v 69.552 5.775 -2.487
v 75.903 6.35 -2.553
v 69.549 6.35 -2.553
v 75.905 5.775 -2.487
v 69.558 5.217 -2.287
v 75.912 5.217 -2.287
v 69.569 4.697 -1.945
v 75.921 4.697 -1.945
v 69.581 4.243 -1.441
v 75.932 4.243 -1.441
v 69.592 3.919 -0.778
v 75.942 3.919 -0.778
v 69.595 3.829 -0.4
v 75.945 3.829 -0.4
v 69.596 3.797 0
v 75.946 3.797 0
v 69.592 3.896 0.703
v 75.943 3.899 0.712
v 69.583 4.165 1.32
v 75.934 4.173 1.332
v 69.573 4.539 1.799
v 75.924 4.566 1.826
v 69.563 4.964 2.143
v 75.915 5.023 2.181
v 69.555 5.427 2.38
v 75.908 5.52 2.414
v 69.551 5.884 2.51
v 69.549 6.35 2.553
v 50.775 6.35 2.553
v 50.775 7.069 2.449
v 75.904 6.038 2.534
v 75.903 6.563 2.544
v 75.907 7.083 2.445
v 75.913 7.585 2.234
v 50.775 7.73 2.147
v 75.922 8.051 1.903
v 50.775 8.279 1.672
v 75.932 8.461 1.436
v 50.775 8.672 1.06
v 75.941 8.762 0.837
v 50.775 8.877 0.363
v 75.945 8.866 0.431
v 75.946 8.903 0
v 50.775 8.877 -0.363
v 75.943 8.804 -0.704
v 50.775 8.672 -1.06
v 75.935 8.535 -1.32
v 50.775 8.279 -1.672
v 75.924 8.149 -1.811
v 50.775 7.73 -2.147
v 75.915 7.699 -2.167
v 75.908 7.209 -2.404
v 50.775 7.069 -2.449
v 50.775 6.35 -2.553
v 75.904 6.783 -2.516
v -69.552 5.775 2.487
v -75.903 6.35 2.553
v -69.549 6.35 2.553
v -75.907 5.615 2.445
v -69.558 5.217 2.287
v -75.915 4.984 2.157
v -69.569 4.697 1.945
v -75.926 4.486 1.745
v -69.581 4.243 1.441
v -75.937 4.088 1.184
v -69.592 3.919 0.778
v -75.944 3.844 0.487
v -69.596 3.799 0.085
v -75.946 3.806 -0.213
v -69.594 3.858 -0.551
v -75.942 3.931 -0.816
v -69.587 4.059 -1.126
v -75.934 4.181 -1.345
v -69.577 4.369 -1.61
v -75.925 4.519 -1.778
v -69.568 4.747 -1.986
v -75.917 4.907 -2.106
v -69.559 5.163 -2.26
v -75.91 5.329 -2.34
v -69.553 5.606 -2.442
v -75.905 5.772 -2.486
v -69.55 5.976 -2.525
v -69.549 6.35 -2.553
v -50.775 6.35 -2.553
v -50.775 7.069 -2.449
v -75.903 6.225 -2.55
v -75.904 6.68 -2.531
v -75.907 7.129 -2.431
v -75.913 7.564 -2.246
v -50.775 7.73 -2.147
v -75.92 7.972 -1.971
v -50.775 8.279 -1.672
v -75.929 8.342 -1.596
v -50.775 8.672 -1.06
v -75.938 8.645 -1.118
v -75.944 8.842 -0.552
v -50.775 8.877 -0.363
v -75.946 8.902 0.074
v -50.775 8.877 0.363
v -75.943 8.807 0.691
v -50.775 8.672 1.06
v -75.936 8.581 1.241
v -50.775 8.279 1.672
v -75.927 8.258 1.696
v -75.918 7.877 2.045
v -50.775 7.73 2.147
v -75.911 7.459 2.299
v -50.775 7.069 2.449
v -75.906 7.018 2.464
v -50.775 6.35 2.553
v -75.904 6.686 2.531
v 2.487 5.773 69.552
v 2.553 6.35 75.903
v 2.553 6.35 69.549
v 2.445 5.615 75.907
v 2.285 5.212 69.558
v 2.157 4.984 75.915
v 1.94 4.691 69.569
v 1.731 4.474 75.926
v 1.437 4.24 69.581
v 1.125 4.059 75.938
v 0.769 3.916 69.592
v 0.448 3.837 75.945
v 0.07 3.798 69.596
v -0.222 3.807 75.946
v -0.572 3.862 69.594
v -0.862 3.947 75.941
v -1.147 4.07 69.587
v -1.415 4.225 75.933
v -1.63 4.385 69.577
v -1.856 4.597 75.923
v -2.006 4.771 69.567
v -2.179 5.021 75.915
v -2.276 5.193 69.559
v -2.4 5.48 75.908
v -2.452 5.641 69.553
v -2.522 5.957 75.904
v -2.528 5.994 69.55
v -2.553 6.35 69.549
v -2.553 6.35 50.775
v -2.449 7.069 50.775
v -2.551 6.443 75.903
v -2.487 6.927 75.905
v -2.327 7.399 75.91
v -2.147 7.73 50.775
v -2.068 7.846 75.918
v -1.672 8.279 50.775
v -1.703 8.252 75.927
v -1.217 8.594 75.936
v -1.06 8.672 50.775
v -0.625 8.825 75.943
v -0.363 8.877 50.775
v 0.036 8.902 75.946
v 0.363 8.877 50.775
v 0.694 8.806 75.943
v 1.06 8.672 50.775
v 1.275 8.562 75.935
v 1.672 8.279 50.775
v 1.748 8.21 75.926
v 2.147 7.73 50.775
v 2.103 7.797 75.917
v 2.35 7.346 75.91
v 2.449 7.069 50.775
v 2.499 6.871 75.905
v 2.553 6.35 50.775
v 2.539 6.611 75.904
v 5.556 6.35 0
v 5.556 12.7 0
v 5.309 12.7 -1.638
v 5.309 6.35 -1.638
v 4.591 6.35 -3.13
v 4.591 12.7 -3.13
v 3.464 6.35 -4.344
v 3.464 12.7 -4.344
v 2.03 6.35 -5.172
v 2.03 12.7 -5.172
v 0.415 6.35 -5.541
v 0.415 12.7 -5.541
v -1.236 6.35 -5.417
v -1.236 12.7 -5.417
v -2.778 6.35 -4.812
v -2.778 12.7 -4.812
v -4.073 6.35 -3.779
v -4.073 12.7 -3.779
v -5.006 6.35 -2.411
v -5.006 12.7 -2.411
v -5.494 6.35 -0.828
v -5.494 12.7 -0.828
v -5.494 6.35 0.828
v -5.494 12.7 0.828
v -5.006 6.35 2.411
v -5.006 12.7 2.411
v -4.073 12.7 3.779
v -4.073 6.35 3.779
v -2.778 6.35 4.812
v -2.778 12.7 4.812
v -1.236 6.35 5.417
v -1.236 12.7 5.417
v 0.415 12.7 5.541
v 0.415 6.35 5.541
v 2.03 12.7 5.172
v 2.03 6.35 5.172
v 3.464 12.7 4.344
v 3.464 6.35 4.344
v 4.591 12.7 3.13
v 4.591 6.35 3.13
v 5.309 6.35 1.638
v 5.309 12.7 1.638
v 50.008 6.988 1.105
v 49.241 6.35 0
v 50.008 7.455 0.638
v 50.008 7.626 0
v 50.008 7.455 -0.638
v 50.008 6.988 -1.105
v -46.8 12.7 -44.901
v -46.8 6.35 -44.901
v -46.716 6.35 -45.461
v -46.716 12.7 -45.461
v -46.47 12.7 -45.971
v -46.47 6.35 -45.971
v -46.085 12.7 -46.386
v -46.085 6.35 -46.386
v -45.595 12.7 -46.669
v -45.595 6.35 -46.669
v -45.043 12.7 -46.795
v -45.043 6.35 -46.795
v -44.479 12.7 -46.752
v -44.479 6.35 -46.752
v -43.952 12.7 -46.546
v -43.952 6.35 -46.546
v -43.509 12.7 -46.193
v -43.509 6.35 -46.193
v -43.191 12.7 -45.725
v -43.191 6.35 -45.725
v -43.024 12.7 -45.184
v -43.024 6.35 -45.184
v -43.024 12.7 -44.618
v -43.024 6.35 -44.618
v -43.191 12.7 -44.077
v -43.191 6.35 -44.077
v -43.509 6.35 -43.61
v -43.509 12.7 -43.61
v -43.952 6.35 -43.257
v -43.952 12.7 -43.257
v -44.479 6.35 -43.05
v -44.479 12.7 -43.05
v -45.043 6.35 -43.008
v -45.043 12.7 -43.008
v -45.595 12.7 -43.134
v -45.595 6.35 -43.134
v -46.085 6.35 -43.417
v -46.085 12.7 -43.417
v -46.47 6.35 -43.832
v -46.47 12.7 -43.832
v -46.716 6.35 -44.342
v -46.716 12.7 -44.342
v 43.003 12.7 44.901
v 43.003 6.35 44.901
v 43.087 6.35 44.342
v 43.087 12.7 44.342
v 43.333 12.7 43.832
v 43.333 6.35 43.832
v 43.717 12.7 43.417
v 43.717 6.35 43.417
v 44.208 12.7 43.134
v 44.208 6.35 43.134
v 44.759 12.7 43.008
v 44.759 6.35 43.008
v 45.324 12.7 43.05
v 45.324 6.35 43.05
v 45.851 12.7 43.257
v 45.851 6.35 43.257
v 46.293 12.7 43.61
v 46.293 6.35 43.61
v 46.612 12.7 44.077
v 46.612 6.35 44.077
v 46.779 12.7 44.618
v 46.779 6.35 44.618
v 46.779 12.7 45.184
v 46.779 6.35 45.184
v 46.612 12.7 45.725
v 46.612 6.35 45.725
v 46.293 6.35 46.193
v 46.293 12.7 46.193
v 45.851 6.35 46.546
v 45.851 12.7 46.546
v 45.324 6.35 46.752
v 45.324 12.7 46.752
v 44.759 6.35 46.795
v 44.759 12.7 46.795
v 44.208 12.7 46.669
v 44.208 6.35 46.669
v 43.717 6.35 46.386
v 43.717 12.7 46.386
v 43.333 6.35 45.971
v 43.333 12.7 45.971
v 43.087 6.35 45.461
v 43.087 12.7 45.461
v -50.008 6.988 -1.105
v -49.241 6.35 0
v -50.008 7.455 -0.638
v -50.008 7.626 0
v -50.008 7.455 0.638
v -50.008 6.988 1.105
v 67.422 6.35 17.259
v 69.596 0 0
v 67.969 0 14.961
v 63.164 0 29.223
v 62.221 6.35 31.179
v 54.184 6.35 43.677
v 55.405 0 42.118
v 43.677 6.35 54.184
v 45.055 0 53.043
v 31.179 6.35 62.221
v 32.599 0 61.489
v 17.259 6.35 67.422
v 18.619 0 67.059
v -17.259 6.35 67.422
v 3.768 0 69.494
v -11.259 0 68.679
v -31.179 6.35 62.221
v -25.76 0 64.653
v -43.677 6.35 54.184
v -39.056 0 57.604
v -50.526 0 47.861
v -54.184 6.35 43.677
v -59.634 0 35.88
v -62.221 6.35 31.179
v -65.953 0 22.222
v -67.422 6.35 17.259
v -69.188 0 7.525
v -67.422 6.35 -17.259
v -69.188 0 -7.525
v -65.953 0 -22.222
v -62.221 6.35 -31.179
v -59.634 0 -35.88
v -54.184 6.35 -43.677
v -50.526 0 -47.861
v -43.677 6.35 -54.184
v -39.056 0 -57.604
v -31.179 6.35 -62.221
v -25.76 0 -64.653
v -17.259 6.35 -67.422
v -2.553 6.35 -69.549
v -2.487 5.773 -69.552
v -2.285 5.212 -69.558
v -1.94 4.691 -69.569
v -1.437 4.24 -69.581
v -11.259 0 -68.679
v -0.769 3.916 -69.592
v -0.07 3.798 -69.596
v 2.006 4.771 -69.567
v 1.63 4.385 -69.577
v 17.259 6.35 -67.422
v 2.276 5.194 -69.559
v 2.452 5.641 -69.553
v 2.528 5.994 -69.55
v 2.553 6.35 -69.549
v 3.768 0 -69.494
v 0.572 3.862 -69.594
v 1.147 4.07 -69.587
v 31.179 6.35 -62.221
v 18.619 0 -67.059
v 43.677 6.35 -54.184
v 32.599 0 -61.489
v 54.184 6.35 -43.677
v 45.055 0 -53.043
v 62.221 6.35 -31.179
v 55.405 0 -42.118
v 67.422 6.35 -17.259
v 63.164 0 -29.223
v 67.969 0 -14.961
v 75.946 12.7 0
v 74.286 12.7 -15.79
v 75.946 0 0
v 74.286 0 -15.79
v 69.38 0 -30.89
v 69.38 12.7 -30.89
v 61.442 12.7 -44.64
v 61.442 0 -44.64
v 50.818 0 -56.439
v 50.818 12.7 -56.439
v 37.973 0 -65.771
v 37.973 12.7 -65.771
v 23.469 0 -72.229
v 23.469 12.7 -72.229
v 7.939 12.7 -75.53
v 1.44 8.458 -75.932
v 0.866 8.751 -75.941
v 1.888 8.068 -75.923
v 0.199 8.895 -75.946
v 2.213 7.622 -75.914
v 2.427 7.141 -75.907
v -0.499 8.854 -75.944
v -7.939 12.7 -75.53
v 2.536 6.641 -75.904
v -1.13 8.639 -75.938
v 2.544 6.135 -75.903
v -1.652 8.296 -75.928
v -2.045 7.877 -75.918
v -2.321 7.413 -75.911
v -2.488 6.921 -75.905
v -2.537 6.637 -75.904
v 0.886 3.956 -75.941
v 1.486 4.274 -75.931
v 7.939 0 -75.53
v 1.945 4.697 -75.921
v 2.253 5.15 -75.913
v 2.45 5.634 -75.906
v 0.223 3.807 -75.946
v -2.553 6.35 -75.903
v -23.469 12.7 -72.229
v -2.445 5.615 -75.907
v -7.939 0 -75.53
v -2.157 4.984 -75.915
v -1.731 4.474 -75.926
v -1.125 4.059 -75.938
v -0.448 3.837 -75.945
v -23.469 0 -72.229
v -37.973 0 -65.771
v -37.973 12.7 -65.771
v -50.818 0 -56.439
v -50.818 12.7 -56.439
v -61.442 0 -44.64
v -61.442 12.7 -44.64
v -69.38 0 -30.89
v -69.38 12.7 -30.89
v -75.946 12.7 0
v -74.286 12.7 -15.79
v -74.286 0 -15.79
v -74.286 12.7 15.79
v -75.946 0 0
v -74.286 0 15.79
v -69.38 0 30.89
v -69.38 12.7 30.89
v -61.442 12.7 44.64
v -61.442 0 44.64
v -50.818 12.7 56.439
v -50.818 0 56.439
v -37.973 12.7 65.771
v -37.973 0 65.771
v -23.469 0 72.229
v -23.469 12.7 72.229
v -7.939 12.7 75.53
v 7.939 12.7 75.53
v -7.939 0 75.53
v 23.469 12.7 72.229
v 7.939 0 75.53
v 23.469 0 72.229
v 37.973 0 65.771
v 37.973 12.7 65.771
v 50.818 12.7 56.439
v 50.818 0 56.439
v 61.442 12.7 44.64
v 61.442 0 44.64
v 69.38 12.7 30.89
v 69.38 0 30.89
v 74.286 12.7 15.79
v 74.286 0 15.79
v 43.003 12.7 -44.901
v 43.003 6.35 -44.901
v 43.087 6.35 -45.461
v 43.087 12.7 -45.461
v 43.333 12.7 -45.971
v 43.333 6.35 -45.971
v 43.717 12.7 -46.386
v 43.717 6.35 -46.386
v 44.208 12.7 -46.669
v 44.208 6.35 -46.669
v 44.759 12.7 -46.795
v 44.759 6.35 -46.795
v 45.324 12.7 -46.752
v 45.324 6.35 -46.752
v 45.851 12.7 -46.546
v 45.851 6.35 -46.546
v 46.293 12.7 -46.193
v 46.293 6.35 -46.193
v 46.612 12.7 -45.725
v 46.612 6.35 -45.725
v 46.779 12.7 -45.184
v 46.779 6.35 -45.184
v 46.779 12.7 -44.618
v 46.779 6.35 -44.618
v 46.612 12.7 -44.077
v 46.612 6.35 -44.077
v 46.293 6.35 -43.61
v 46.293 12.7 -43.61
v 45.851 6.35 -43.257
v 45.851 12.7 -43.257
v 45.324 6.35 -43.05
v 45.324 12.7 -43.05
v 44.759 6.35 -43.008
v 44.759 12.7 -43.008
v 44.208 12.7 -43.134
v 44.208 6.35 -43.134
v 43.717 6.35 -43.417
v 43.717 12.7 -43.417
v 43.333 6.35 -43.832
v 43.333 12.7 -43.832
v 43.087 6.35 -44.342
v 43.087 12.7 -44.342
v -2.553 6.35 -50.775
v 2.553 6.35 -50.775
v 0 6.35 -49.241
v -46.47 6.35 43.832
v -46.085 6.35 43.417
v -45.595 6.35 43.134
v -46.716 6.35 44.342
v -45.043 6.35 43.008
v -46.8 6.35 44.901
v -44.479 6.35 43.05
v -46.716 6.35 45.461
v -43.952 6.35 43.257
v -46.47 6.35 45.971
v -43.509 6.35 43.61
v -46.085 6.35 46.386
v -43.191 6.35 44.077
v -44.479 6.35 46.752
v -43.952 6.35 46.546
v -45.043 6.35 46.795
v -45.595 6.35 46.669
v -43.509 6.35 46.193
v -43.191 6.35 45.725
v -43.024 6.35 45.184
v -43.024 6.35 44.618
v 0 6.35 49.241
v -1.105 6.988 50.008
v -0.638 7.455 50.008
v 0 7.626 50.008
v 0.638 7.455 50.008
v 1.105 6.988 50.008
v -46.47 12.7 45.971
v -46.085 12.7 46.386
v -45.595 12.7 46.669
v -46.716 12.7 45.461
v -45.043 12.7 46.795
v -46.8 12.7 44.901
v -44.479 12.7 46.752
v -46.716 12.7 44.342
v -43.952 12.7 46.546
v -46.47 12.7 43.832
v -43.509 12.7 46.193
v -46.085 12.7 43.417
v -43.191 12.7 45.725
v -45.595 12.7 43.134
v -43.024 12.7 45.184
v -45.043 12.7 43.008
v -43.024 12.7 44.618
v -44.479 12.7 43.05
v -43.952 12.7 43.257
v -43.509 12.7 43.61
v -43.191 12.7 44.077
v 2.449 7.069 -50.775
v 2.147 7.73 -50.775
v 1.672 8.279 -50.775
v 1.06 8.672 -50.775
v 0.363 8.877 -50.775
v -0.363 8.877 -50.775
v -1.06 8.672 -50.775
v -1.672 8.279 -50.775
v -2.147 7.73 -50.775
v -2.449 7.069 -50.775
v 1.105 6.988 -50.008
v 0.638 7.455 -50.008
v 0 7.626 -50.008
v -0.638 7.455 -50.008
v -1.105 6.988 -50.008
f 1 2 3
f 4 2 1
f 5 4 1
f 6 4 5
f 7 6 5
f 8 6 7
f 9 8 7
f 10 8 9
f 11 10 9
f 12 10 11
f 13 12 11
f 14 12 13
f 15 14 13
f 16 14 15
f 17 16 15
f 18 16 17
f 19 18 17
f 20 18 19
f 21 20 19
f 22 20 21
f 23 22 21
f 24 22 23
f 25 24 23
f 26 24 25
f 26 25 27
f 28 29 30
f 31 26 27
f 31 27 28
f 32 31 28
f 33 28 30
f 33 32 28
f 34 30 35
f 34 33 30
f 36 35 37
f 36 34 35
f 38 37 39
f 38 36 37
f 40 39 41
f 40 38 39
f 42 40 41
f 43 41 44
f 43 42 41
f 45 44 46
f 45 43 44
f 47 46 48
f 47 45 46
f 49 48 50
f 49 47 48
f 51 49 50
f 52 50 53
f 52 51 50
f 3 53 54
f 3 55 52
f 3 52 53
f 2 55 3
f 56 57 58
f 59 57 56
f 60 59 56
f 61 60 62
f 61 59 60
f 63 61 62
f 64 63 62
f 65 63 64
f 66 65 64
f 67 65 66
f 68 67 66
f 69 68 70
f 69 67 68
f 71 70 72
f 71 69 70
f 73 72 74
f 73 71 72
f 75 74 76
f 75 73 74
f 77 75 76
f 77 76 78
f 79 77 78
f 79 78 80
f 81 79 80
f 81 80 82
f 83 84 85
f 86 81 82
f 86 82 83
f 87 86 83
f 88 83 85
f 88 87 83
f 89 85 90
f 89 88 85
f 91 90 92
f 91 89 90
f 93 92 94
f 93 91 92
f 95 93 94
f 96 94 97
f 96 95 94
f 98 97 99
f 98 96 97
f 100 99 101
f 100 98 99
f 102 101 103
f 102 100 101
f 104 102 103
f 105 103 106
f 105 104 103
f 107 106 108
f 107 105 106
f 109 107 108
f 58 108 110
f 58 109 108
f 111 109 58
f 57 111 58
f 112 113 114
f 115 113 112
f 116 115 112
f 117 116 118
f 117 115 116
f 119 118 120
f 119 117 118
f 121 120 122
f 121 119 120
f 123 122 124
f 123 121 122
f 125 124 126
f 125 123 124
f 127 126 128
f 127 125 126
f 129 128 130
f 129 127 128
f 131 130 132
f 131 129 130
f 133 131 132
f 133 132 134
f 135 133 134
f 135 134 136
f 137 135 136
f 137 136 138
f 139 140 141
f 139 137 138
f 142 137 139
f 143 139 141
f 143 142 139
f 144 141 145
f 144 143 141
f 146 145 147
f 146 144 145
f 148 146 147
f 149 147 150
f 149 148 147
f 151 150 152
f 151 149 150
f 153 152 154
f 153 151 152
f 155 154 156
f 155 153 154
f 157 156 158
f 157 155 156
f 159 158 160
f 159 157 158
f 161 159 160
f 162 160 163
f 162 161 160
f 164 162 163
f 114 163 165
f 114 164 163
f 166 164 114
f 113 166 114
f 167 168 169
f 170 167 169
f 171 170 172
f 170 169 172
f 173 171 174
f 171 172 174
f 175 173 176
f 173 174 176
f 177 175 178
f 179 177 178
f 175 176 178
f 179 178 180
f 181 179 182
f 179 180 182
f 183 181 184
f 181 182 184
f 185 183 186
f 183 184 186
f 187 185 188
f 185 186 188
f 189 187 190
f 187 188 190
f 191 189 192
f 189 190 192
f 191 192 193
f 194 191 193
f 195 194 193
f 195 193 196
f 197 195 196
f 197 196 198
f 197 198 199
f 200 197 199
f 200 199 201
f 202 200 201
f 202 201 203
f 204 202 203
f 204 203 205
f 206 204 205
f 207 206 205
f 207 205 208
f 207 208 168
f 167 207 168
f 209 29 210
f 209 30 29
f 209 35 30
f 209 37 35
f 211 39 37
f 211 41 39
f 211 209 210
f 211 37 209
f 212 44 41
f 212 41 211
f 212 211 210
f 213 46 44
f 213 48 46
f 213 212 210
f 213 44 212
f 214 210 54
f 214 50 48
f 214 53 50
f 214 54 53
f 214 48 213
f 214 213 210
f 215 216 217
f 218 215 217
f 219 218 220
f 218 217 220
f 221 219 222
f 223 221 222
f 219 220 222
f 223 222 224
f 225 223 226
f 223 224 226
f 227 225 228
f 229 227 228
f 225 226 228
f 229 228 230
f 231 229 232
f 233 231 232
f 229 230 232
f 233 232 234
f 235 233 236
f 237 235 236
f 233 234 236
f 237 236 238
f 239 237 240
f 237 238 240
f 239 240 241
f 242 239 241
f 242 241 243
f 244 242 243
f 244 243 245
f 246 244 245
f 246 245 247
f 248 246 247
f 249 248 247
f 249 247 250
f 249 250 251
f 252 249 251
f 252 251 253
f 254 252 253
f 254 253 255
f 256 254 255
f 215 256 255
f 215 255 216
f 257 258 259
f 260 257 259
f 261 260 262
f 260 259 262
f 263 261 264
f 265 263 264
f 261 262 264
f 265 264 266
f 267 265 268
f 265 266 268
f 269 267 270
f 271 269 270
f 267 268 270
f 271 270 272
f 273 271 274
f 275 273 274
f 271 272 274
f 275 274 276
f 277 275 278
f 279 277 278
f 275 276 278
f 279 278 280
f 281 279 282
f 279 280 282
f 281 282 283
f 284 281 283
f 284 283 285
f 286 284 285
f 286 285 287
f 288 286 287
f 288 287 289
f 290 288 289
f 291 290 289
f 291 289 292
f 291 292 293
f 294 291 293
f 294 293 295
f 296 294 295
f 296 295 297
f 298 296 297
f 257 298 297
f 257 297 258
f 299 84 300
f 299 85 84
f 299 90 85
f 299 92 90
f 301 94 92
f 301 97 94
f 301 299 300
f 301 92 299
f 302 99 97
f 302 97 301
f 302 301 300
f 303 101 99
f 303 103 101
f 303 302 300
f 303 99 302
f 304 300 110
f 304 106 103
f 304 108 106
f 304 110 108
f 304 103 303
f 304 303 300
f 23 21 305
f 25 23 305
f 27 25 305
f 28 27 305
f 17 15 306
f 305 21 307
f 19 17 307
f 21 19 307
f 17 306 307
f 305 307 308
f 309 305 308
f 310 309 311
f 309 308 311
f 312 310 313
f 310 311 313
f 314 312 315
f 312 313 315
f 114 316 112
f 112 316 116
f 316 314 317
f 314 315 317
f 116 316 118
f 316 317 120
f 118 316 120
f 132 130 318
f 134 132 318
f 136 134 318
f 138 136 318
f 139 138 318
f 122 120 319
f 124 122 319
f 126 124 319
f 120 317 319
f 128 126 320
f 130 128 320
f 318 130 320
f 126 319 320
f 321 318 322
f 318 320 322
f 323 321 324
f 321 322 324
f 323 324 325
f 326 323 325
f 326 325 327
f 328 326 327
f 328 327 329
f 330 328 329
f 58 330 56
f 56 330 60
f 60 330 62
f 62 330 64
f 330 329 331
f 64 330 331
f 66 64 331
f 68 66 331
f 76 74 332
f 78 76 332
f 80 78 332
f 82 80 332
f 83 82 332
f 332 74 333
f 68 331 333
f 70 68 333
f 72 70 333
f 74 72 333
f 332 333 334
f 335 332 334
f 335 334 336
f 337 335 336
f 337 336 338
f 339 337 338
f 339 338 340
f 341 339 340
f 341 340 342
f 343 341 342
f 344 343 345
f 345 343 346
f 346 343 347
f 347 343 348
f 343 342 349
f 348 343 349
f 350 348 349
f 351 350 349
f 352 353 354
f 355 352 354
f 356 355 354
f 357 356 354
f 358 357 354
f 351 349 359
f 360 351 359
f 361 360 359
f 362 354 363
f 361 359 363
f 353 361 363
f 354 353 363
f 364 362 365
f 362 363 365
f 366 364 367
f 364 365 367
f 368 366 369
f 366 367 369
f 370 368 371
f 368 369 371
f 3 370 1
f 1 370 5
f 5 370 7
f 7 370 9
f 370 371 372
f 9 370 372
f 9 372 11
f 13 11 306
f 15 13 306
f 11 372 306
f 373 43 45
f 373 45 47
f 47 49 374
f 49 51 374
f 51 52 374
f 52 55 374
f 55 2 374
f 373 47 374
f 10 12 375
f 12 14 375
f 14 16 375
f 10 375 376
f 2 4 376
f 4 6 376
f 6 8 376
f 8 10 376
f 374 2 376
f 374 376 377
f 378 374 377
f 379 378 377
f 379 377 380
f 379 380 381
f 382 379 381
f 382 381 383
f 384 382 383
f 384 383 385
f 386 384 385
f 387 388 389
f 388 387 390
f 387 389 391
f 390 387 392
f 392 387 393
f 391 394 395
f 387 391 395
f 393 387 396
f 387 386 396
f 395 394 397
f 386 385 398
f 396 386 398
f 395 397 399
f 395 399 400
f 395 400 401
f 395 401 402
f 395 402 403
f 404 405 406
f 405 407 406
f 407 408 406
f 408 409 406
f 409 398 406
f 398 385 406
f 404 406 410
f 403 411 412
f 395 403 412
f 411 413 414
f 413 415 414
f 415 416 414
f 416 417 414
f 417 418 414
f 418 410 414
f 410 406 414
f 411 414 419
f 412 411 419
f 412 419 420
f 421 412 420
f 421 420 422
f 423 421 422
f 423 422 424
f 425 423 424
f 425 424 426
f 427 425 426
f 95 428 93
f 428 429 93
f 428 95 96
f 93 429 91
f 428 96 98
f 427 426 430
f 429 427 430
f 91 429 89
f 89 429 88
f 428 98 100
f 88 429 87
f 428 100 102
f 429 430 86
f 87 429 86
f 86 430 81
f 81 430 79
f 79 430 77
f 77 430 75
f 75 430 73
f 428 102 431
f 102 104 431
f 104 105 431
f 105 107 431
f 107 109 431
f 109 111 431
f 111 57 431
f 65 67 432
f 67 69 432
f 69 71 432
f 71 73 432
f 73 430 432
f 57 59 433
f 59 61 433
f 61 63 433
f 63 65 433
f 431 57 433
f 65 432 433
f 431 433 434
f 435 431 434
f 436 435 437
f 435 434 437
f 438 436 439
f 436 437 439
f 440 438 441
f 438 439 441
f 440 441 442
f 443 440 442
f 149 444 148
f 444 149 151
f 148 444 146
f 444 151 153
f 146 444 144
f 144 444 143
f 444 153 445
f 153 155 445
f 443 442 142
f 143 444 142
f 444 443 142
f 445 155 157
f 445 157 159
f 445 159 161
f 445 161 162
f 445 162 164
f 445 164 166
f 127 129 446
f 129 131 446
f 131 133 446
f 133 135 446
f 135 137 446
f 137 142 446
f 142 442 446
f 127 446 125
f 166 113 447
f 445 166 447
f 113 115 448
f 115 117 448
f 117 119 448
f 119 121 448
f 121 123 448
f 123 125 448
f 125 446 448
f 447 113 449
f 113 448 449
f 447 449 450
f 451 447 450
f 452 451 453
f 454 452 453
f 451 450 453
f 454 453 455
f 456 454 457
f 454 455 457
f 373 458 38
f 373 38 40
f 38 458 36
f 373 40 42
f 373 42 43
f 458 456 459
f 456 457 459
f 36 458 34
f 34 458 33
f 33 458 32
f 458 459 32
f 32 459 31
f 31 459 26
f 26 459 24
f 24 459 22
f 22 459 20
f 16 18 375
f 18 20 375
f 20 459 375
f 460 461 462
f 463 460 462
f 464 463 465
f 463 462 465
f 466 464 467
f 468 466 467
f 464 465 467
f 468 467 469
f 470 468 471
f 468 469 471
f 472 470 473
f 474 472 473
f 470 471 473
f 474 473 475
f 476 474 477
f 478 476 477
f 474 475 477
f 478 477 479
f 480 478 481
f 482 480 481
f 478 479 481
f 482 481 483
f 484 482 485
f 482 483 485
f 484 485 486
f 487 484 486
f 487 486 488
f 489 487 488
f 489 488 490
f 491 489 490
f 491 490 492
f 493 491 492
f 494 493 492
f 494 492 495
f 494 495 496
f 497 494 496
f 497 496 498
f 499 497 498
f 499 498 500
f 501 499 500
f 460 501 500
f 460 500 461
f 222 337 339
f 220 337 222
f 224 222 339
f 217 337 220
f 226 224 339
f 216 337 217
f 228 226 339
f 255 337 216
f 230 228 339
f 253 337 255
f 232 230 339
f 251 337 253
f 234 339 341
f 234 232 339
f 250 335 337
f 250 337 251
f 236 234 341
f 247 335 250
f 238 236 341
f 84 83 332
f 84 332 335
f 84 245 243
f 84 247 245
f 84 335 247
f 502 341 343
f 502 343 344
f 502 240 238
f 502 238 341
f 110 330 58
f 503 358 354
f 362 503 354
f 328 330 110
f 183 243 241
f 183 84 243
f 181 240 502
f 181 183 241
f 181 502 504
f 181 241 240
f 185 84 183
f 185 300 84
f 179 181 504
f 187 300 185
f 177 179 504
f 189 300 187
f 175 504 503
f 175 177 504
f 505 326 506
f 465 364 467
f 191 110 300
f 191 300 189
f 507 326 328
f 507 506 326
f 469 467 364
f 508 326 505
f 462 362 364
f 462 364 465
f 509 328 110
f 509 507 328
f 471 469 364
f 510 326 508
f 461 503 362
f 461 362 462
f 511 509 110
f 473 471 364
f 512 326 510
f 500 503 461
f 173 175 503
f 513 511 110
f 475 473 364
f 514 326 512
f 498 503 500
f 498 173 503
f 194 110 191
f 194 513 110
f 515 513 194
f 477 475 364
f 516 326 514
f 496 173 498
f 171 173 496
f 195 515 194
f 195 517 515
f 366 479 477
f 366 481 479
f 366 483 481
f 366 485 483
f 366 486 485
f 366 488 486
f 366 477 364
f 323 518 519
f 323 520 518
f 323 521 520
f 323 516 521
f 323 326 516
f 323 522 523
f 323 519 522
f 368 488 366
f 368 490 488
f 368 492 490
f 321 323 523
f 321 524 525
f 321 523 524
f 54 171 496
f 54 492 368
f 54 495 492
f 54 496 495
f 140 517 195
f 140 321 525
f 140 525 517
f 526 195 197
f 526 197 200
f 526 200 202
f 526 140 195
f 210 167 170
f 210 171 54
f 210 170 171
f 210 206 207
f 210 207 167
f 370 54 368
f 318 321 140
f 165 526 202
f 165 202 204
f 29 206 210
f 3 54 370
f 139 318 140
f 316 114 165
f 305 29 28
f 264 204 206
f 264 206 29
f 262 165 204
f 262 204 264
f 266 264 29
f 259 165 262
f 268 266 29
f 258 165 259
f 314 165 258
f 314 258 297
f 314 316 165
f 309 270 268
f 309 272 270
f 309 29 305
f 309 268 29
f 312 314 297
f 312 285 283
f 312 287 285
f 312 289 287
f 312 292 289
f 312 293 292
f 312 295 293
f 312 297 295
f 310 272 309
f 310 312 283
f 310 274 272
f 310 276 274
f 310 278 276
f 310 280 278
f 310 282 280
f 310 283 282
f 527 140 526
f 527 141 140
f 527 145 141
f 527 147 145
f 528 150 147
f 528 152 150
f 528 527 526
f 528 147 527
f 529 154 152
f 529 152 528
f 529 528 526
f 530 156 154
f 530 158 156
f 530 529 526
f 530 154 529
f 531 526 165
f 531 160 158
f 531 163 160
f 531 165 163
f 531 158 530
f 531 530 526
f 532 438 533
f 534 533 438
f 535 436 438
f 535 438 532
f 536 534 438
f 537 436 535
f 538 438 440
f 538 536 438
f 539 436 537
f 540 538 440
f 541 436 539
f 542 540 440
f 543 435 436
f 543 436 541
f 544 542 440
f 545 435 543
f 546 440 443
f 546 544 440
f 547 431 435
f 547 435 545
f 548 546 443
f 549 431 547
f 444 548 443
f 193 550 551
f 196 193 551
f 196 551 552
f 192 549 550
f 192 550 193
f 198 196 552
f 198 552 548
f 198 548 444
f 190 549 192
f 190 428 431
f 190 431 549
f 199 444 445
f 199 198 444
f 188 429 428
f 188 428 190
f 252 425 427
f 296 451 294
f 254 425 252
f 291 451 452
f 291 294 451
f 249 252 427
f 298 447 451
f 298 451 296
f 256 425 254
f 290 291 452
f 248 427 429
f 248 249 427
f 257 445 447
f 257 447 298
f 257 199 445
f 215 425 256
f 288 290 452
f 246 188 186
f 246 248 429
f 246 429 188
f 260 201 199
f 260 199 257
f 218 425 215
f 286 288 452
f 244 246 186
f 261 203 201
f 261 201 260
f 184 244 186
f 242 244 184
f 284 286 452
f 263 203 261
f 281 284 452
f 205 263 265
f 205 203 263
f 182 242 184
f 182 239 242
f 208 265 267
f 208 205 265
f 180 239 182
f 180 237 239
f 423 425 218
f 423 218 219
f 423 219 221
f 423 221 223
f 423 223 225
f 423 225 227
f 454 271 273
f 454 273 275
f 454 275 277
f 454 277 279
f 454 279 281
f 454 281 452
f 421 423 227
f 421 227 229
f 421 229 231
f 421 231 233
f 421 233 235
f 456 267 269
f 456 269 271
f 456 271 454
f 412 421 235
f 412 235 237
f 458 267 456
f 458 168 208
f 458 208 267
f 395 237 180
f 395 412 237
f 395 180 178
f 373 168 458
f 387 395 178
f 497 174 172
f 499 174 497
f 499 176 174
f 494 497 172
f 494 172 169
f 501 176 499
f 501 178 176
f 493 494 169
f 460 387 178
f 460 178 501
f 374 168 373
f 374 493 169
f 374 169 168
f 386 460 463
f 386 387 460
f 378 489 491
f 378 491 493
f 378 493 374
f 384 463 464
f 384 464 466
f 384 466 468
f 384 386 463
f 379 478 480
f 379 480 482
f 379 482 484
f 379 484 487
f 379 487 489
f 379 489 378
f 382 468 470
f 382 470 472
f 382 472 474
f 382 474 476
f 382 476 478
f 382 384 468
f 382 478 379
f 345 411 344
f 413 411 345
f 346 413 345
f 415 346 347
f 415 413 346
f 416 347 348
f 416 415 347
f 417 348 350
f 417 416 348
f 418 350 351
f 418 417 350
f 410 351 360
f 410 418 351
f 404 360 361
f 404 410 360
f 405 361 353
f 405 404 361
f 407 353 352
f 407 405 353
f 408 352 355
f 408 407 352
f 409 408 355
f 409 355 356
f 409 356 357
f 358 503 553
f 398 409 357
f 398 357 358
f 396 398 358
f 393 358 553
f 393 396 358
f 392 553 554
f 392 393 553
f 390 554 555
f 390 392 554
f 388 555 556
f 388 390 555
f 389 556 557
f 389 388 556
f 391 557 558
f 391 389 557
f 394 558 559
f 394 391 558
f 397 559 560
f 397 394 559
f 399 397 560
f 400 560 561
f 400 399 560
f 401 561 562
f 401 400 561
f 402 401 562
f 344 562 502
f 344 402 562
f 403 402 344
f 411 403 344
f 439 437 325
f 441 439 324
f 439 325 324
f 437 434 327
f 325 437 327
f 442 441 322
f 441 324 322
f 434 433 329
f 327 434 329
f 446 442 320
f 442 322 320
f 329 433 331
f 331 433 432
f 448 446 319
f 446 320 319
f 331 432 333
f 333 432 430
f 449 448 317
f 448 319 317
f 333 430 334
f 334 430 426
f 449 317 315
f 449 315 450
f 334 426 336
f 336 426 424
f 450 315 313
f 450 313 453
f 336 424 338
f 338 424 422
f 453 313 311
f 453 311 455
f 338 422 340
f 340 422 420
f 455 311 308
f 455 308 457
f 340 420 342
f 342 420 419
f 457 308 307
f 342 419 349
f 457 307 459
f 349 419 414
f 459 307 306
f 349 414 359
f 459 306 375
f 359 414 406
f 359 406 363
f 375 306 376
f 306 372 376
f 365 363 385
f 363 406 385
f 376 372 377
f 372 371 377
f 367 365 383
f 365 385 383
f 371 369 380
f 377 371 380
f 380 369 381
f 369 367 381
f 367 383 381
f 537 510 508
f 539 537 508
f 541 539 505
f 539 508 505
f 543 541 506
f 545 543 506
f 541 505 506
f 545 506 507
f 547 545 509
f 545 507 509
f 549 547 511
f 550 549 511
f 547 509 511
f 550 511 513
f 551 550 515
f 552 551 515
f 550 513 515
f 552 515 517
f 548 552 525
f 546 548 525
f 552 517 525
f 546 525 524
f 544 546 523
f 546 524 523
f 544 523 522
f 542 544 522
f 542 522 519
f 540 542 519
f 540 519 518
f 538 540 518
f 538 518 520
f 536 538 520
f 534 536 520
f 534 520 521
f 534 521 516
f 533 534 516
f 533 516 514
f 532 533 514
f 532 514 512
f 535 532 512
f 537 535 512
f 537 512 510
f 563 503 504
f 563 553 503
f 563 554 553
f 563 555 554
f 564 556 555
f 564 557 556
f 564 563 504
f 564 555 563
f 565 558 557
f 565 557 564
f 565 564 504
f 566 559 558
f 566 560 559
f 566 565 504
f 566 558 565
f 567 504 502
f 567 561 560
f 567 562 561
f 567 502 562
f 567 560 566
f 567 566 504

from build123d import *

# Parameters (mm, degrees)
SKETCH2_R                  = 75.946
BOSS_EXTRUDE1_DEPTH        = 12.7
SKETCH3_R                  = 5.55625
CUT_EXTRUDE1_DEPTH         = 1
CUT_EXTRUDE1_DEPTH_BACK    = 13.7
CIRPATTERN2_COUNT          = 4
CIRPATTERN2_ANGLE          = 270
SKETCH11_R                 = 69.596
CUT_EXTRUDE2_DEPTH         = 6.35
F_10_24_TAPPED_HOLE1_D     = 3.7973
F_10_24_TAPPED_HOLE1_DEPTH = 12.82954
F_10_24_TAPPED_HOLE1_TIP   = 1.140824014


with BuildPart() as part:
    # Sketch2 → Boss-Extrude1 (new body)
    with BuildSketch(Plane(origin=(0, 0, 0), x_dir=(1, 0, 0), z_dir=(0, 1, 0))):
        Circle(SKETCH2_R)
    extrude(amount=BOSS_EXTRUDE1_DEPTH)

    # Sketch3 → Cut-Extrude1 (cut, two sides)
    with BuildSketch(Plane(origin=(0, 12.7, 0), x_dir=(1, 0, 0), z_dir=(0, 1, 0))) as cut_extrude1_sk:
        Circle(SKETCH3_R)
    extrude(amount=CUT_EXTRUDE1_DEPTH, mode=Mode.SUBTRACT)
    extrude(cut_extrude1_sk.sketch, amount=-CUT_EXTRUDE1_DEPTH_BACK, mode=Mode.SUBTRACT)

    # Sketch10 → 1/4-20 Tapped Hole1 (revolve, cut)
    with BuildSketch(Plane(origin=(-76.1746, 6.35, 0), x_dir=(0, 0, 1), z_dir=(0, 1, 0))):
        Polygon((0, 0), (0, 26.933816902), (2.5527, 25.4), (2.5527, 0), align=None)
    f_1_4_20_tapped_hole1 = revolve(axis=Axis((-82.5246, 6.35, 0), (1, 0, 0)), mode=Mode.SUBTRACT)

    # CirPattern2: 1/4-20 Tapped Hole1 ×4 about axis
    cirpattern2_axis = Axis((0, 12.7, 0), (0, -1, 0))
    for i in range(1, CIRPATTERN2_COUNT):
        add(f_1_4_20_tapped_hole1.rotate(cirpattern2_axis, i * CIRPATTERN2_ANGLE / (CIRPATTERN2_COUNT - 1)), mode=Mode.SUBTRACT)

    # Sketch11 → Cut-Extrude2 (cut)
    with BuildSketch(Plane.XZ):
        Circle(SKETCH11_R)
    extrude(amount=-CUT_EXTRUDE2_DEPTH, mode=Mode.SUBTRACT)

    # #10-24 Tapped Hole1
    with Locations(Plane(origin=(0, 12.7, 0), x_dir=(1, 0, 0), z_dir=(0, 1, 0))):
        with Locations((0, 0), (44.901280605, 44.901280605), (44.901280605, -44.901280605), (-44.901280605, -44.901280605), (-44.901280605, 44.901280605)):
            Hole(F_10_24_TAPPED_HOLE1_D / 2, depth=F_10_24_TAPPED_HOLE1_DEPTH)
            with Locations((0, 0, -(F_10_24_TAPPED_HOLE1_DEPTH + F_10_24_TAPPED_HOLE1_TIP / 2))):  # 118° drill point
                Cone(0, F_10_24_TAPPED_HOLE1_D / 2, F_10_24_TAPPED_HOLE1_TIP, mode=Mode.SUBTRACT)


solid = part.part
